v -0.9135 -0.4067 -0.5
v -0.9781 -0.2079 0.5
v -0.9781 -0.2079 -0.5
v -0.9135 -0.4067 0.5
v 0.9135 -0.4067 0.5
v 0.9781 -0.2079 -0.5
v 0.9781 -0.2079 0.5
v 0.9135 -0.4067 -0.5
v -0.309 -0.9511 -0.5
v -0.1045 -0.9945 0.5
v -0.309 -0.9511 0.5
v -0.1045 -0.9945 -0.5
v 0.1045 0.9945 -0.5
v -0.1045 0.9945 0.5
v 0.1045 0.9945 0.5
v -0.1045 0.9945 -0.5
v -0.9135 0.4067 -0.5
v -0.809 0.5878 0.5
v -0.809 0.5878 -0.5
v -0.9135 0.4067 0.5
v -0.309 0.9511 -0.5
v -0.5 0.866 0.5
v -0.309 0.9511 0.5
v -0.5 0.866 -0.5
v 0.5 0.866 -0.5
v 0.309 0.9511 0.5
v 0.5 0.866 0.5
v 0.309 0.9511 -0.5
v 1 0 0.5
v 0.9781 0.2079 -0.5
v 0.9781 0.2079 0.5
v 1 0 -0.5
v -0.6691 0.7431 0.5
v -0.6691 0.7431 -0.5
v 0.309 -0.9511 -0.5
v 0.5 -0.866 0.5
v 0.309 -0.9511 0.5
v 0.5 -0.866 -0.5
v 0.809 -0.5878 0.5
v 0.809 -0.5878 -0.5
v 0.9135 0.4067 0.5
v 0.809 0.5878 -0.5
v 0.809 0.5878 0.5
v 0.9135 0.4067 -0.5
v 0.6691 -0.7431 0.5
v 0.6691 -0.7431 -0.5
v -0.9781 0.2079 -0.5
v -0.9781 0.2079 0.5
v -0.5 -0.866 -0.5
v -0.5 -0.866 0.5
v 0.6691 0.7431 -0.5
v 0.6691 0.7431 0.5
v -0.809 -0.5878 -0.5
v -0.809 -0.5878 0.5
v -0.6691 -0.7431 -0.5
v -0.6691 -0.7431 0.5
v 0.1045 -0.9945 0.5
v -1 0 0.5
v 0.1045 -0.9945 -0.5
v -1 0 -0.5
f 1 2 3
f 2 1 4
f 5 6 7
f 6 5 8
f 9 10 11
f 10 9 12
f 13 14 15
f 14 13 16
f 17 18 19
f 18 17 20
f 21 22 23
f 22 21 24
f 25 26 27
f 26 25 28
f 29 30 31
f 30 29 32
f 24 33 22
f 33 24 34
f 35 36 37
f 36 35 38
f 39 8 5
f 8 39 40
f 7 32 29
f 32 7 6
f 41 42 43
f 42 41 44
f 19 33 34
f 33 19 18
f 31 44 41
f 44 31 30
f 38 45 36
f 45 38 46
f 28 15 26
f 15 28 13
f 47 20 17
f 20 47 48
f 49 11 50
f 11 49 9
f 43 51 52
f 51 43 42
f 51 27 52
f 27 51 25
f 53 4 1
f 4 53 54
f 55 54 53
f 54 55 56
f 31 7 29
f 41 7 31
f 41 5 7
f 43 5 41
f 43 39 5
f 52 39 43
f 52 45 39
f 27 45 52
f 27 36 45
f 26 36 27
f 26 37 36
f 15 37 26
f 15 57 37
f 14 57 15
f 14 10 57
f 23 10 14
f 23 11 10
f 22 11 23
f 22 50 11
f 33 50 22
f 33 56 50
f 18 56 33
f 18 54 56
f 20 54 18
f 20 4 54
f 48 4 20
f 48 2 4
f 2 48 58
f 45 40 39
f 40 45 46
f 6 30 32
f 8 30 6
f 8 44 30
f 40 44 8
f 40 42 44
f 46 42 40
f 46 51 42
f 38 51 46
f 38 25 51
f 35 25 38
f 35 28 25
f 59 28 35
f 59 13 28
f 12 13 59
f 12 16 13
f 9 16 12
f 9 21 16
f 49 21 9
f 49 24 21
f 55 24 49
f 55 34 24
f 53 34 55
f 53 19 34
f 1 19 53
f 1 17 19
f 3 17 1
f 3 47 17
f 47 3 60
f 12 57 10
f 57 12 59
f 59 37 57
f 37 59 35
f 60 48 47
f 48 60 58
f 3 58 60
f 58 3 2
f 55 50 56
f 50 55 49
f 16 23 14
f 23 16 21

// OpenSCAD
// file: IKEA Skadis v2 hook cutouts.scad
skadis_hook_width = 4.5;
skadis_hook_height = 46;
skadis_hole_spacing_width = 40; // middle to middle
cutout_tolerance_w = 0.4;
cutout_tolerance_h = 0.6;


module skadis_hook_cutout(center=false, hook_count=2) {
    
    if(center) {
        translate([-(skadis_hole_spacing_width + skadis_hook_width) / 2, 0, - skadis_hook_height / 2])
        object(hook_count);
    } else {
        object();
    }
    

}

module object(hook_count=2) {
    union() {

        // Cutout for the hook 1
        color("red")
        translate([- cutout_tolerance_w / 2, 0, - cutout_tolerance_h / 2])
        cube([skadis_hook_width + cutout_tolerance_w, 2, skadis_hook_height + cutout_tolerance_h]);

        // Cutout for the hook 2
        color("red")
        translate([- cutout_tolerance_w / 2 + skadis_hole_spacing_width, 0, - cutout_tolerance_h / 2])
        cube([skadis_hook_width + cutout_tolerance_w, 2, skadis_hook_height + cutout_tolerance_h]);

    }
}

skadis_hook_cutout(center = false);
// file: ../../../modules/scad/roundedcube.scad
// More information: https://danielupshaw.com/openscad-rounded-corners/


// Examples
// color("Yellow")
// roundedcube(3, true, 0.7, "xmin");

// translate(v = [1, 0, 2])
// color("Pink")
// roundedcube([4, 2, 2], false, 0.6, "zmax");

// translate(v = [-4, -1, 2])
// color("Lightblue")
// roundedcube(2, false);

// translate(v = [0, 0, 6])
// color("Orange")
// roundedcube([3, 2, 2], true, 0.2);

// translate(v = [2.5, -0.5, 5])
// color("Green")
// roundedcube([3, 2, 2], false, 0.4, "z");

// Set to 0.01 for higher definition curves (renders slower)
$fs = 0.15;

module roundedcube(size = [1, 1, 1], center = false, radius = 0.5, apply_to = "all") {
	// If single value, convert to [x, y, z] vector
	size = (size[0] == undef) ? [size, size, size] : size;

	translate_min = radius;
	translate_xmax = size[0] - radius;
	translate_ymax = size[1] - radius;
	translate_zmax = size[2] - radius;

	diameter = radius * 2;

	obj_translate = (center == false) ?
		[0, 0, 0] : [
			-(size[0] / 2),
			-(size[1] / 2),
			-(size[2] / 2)
		];

	translate(v = obj_translate) {
		hull() {
			for (translate_x = [translate_min, translate_xmax]) {
				x_at = (translate_x == translate_min) ? "min" : "max";
				for (translate_y = [translate_min, translate_ymax]) {
					y_at = (translate_y == translate_min) ? "min" : "max";
					for (translate_z = [translate_min, translate_zmax]) {
						z_at = (translate_z == translate_min) ? "min" : "max";

						translate(v = [translate_x, translate_y, translate_z])
						if (
							(apply_to == "all") ||
							(apply_to == "xmin" && x_at == "min") || (apply_to == "xmax" && x_at == "max") ||
							(apply_to == "ymin" && y_at == "min") || (apply_to == "ymax" && y_at == "max") ||
							(apply_to == "zmin" && z_at == "min") || (apply_to == "zmax" && z_at == "max")
						) {
							sphere(r = radius);
						} else {
							rotate = 
								(apply_to == "xmin" || apply_to == "xmax" || apply_to == "x") ? [0, 90, 0] : (
								(apply_to == "ymin" || apply_to == "ymax" || apply_to == "y") ? [90, 90, 0] :
								[0, 0, 0]
							);
							rotate(a = rotate)
							cylinder(h = diameter, r = radius, center = true);
						}
					}
				}
			}
		}
	}
}
// file: ../modules/roundedcube.scad
// More information: https://danielupshaw.com/openscad-rounded-corners/


// Examples
// color("Yellow")
// roundedcube(3, true, 0.7, "xmin");

// translate(v = [1, 0, 2])
// color("Pink")
// roundedcube([4, 2, 2], false, 0.6, "zmax");

// translate(v = [-4, -1, 2])
// color("Lightblue")
// roundedcube(2, false);

// translate(v = [0, 0, 6])
// color("Orange")
// roundedcube([3, 2, 2], true, 0.2);

// translate(v = [2.5, -0.5, 5])
// color("Green")
// roundedcube([3, 2, 2], false, 0.4, "z");

// Set to 0.01 for higher definition curves (renders slower)
$fs = 0.15;

module roundedcube(size = [1, 1, 1], center = false, radius = 0.5, apply_to = "all") {
	// If single value, convert to [x, y, z] vector
	size = (size[0] == undef) ? [size, size, size] : size;

	translate_min = radius;
	translate_xmax = size[0] - radius;
	translate_ymax = size[1] - radius;
	translate_zmax = size[2] - radius;

	diameter = radius * 2;

	obj_translate = (center == false) ?
		[0, 0, 0] : [
			-(size[0] / 2),
			-(size[1] / 2),
			-(size[2] / 2)
		];

	translate(v = obj_translate) {
		hull() {
			for (translate_x = [translate_min, translate_xmax]) {
				x_at = (translate_x == translate_min) ? "min" : "max";
				for (translate_y = [translate_min, translate_ymax]) {
					y_at = (translate_y == translate_min) ? "min" : "max";
					for (translate_z = [translate_min, translate_zmax]) {
						z_at = (translate_z == translate_min) ? "min" : "max";

						translate(v = [translate_x, translate_y, translate_z])
						if (
							(apply_to == "all") ||
							(apply_to == "xmin" && x_at == "min") || (apply_to == "xmax" && x_at == "max") ||
							(apply_to == "ymin" && y_at == "min") || (apply_to == "ymax" && y_at == "max") ||
							(apply_to == "zmin" && z_at == "min") || (apply_to == "zmax" && z_at == "max")
						) {
							sphere(r = radius);
						} else {
							rotate = 
								(apply_to == "xmin" || apply_to == "xmax" || apply_to == "x") ? [0, 90, 0] : (
								(apply_to == "ymin" || apply_to == "ymax" || apply_to == "y") ? [90, 90, 0] :
								[0, 0, 0]
							);
							rotate(a = rotate)
							cylinder(h = diameter, r = radius, center = true);
						}
					}
				}
			}
		}
	}
}
// file: IKEA Skadis v2 Bin.scad
_width = 60 + 1.6 + 1.6;
_depth = 60 + 1.6 + 1.6;
_height = 100;
_thickness = 1.6;  //Recommended minimum 1.6

//use <./IKEA Skadis include backwall with 3 hooks.scad>
use <../../../modules/scad/roundedcube.scad>
use <./IKEA Skadis v2 hook cutouts.scad>



module bin(_w, _d, _h, _t, _r) {

    difference() {
        translate([0, _d / 2, 0])
        difference() {
            roundedcube(size = [_w, _d, _h], center = true, radius = _r, apply_to = "z");
            color("red")
            translate([0, 0, _t])
            roundedcube(size = [_w - _t * 2, _d - _t * 2, _h - _t * 2 + 1], center = true, radius = _r, apply_to = "z");
        }
        color("green")
        translate([0, -1.4, 0])
        skadis_hook_cutout(center=true, 3);
    }
}

bin(_width, _depth, _height, _thickness, 5);
// main file
_width = 81;
_depth = 33;
_height = 70;
_thickness = 1.6; //Recommended minimum 1.6

_bottom_cutout = 1;
_bottom_cutout_width = 15;
_bottom_cutout_depth = 20;

_right_cutout = 0;
_right_cutout_depth = 13;
_right_cutout_height = 20;
_right_cutout_z_offset = 30; // (_height - _left_cutout_height) / 2
_right_cutout_y_offset = 20; // (_depth - _left_cutout_depth) / 2

_left_cutout = 0;
_left_cutout_depth = 13; //16
_left_cutout_height = 20;
_left_cutout_z_offset = 30; // (_height - _right_cutout_height) / 2
_left_cutout_y_offset = 20; // (_depth - _left_cutout_depth) / 2

_front_cutout = 1;
_front_cutout_width = 20;
_front_cutout_height = 30;
_front_cutout_z_offset = 14; // Middle = (_height - _front_cutout_height) / 2;

use <./IKEA Skadis v2 Bin.scad>
use <../modules/roundedcube.scad>

difference() {
    translate([_width / 2, 0, _height / 2])
    bin(_width, _depth, _height, _thickness);

    // Bottom cutout
    if(_bottom_cutout == 1) {
        translate([(_width - _bottom_cutout_width) / 2, (_depth - _bottom_cutout_depth) / 2, -1])
        //cube([_bottom_cutout_width, _bottom_cutout_depth, _thickness + 2]);
        roundedcube(size = [_bottom_cutout_width, _bottom_cutout_depth, _thickness + 2], center = false, radius = 5, apply_to = "z");
    }

    // Right cutout
    if(_right_cutout == 1) {
        translate([_width - _thickness - 1, _depth - _right_cutout_depth - _right_cutout_y_offset, _left_cutout_z_offset])
        roundedcube(size = [_thickness + 2, _right_cutout_depth, _right_cutout_height], center = false, radius = 2.5, apply_to = "x");
    }

    // Left cutout
    if(_left_cutout == 1) {
        translate([- 1, _depth - _left_cutout_depth - _left_cutout_y_offset, _left_cutout_z_offset])
        roundedcube(size = [_thickness + 2, _left_cutout_depth, _left_cutout_height], center = false, radius = 2.5, apply_to = "x");
    }

    // Front cutout
    if(_front_cutout == 1) {
        color("red")
        translate([(_width - _front_cutout_width) / 2, _depth -1, _front_cutout_z_offset])
        //cube([_bottom_cutout_width, _bottom_cutout_depth, _thickness + 2]);
        roundedcube(size = [_front_cutout_width, _thickness, _front_cutout_height], center = false, radius = 5, apply_to = "y");
    }
}

// color("pink")
// translate([3, 2, 2])
// cube([124, 39, 74]);
